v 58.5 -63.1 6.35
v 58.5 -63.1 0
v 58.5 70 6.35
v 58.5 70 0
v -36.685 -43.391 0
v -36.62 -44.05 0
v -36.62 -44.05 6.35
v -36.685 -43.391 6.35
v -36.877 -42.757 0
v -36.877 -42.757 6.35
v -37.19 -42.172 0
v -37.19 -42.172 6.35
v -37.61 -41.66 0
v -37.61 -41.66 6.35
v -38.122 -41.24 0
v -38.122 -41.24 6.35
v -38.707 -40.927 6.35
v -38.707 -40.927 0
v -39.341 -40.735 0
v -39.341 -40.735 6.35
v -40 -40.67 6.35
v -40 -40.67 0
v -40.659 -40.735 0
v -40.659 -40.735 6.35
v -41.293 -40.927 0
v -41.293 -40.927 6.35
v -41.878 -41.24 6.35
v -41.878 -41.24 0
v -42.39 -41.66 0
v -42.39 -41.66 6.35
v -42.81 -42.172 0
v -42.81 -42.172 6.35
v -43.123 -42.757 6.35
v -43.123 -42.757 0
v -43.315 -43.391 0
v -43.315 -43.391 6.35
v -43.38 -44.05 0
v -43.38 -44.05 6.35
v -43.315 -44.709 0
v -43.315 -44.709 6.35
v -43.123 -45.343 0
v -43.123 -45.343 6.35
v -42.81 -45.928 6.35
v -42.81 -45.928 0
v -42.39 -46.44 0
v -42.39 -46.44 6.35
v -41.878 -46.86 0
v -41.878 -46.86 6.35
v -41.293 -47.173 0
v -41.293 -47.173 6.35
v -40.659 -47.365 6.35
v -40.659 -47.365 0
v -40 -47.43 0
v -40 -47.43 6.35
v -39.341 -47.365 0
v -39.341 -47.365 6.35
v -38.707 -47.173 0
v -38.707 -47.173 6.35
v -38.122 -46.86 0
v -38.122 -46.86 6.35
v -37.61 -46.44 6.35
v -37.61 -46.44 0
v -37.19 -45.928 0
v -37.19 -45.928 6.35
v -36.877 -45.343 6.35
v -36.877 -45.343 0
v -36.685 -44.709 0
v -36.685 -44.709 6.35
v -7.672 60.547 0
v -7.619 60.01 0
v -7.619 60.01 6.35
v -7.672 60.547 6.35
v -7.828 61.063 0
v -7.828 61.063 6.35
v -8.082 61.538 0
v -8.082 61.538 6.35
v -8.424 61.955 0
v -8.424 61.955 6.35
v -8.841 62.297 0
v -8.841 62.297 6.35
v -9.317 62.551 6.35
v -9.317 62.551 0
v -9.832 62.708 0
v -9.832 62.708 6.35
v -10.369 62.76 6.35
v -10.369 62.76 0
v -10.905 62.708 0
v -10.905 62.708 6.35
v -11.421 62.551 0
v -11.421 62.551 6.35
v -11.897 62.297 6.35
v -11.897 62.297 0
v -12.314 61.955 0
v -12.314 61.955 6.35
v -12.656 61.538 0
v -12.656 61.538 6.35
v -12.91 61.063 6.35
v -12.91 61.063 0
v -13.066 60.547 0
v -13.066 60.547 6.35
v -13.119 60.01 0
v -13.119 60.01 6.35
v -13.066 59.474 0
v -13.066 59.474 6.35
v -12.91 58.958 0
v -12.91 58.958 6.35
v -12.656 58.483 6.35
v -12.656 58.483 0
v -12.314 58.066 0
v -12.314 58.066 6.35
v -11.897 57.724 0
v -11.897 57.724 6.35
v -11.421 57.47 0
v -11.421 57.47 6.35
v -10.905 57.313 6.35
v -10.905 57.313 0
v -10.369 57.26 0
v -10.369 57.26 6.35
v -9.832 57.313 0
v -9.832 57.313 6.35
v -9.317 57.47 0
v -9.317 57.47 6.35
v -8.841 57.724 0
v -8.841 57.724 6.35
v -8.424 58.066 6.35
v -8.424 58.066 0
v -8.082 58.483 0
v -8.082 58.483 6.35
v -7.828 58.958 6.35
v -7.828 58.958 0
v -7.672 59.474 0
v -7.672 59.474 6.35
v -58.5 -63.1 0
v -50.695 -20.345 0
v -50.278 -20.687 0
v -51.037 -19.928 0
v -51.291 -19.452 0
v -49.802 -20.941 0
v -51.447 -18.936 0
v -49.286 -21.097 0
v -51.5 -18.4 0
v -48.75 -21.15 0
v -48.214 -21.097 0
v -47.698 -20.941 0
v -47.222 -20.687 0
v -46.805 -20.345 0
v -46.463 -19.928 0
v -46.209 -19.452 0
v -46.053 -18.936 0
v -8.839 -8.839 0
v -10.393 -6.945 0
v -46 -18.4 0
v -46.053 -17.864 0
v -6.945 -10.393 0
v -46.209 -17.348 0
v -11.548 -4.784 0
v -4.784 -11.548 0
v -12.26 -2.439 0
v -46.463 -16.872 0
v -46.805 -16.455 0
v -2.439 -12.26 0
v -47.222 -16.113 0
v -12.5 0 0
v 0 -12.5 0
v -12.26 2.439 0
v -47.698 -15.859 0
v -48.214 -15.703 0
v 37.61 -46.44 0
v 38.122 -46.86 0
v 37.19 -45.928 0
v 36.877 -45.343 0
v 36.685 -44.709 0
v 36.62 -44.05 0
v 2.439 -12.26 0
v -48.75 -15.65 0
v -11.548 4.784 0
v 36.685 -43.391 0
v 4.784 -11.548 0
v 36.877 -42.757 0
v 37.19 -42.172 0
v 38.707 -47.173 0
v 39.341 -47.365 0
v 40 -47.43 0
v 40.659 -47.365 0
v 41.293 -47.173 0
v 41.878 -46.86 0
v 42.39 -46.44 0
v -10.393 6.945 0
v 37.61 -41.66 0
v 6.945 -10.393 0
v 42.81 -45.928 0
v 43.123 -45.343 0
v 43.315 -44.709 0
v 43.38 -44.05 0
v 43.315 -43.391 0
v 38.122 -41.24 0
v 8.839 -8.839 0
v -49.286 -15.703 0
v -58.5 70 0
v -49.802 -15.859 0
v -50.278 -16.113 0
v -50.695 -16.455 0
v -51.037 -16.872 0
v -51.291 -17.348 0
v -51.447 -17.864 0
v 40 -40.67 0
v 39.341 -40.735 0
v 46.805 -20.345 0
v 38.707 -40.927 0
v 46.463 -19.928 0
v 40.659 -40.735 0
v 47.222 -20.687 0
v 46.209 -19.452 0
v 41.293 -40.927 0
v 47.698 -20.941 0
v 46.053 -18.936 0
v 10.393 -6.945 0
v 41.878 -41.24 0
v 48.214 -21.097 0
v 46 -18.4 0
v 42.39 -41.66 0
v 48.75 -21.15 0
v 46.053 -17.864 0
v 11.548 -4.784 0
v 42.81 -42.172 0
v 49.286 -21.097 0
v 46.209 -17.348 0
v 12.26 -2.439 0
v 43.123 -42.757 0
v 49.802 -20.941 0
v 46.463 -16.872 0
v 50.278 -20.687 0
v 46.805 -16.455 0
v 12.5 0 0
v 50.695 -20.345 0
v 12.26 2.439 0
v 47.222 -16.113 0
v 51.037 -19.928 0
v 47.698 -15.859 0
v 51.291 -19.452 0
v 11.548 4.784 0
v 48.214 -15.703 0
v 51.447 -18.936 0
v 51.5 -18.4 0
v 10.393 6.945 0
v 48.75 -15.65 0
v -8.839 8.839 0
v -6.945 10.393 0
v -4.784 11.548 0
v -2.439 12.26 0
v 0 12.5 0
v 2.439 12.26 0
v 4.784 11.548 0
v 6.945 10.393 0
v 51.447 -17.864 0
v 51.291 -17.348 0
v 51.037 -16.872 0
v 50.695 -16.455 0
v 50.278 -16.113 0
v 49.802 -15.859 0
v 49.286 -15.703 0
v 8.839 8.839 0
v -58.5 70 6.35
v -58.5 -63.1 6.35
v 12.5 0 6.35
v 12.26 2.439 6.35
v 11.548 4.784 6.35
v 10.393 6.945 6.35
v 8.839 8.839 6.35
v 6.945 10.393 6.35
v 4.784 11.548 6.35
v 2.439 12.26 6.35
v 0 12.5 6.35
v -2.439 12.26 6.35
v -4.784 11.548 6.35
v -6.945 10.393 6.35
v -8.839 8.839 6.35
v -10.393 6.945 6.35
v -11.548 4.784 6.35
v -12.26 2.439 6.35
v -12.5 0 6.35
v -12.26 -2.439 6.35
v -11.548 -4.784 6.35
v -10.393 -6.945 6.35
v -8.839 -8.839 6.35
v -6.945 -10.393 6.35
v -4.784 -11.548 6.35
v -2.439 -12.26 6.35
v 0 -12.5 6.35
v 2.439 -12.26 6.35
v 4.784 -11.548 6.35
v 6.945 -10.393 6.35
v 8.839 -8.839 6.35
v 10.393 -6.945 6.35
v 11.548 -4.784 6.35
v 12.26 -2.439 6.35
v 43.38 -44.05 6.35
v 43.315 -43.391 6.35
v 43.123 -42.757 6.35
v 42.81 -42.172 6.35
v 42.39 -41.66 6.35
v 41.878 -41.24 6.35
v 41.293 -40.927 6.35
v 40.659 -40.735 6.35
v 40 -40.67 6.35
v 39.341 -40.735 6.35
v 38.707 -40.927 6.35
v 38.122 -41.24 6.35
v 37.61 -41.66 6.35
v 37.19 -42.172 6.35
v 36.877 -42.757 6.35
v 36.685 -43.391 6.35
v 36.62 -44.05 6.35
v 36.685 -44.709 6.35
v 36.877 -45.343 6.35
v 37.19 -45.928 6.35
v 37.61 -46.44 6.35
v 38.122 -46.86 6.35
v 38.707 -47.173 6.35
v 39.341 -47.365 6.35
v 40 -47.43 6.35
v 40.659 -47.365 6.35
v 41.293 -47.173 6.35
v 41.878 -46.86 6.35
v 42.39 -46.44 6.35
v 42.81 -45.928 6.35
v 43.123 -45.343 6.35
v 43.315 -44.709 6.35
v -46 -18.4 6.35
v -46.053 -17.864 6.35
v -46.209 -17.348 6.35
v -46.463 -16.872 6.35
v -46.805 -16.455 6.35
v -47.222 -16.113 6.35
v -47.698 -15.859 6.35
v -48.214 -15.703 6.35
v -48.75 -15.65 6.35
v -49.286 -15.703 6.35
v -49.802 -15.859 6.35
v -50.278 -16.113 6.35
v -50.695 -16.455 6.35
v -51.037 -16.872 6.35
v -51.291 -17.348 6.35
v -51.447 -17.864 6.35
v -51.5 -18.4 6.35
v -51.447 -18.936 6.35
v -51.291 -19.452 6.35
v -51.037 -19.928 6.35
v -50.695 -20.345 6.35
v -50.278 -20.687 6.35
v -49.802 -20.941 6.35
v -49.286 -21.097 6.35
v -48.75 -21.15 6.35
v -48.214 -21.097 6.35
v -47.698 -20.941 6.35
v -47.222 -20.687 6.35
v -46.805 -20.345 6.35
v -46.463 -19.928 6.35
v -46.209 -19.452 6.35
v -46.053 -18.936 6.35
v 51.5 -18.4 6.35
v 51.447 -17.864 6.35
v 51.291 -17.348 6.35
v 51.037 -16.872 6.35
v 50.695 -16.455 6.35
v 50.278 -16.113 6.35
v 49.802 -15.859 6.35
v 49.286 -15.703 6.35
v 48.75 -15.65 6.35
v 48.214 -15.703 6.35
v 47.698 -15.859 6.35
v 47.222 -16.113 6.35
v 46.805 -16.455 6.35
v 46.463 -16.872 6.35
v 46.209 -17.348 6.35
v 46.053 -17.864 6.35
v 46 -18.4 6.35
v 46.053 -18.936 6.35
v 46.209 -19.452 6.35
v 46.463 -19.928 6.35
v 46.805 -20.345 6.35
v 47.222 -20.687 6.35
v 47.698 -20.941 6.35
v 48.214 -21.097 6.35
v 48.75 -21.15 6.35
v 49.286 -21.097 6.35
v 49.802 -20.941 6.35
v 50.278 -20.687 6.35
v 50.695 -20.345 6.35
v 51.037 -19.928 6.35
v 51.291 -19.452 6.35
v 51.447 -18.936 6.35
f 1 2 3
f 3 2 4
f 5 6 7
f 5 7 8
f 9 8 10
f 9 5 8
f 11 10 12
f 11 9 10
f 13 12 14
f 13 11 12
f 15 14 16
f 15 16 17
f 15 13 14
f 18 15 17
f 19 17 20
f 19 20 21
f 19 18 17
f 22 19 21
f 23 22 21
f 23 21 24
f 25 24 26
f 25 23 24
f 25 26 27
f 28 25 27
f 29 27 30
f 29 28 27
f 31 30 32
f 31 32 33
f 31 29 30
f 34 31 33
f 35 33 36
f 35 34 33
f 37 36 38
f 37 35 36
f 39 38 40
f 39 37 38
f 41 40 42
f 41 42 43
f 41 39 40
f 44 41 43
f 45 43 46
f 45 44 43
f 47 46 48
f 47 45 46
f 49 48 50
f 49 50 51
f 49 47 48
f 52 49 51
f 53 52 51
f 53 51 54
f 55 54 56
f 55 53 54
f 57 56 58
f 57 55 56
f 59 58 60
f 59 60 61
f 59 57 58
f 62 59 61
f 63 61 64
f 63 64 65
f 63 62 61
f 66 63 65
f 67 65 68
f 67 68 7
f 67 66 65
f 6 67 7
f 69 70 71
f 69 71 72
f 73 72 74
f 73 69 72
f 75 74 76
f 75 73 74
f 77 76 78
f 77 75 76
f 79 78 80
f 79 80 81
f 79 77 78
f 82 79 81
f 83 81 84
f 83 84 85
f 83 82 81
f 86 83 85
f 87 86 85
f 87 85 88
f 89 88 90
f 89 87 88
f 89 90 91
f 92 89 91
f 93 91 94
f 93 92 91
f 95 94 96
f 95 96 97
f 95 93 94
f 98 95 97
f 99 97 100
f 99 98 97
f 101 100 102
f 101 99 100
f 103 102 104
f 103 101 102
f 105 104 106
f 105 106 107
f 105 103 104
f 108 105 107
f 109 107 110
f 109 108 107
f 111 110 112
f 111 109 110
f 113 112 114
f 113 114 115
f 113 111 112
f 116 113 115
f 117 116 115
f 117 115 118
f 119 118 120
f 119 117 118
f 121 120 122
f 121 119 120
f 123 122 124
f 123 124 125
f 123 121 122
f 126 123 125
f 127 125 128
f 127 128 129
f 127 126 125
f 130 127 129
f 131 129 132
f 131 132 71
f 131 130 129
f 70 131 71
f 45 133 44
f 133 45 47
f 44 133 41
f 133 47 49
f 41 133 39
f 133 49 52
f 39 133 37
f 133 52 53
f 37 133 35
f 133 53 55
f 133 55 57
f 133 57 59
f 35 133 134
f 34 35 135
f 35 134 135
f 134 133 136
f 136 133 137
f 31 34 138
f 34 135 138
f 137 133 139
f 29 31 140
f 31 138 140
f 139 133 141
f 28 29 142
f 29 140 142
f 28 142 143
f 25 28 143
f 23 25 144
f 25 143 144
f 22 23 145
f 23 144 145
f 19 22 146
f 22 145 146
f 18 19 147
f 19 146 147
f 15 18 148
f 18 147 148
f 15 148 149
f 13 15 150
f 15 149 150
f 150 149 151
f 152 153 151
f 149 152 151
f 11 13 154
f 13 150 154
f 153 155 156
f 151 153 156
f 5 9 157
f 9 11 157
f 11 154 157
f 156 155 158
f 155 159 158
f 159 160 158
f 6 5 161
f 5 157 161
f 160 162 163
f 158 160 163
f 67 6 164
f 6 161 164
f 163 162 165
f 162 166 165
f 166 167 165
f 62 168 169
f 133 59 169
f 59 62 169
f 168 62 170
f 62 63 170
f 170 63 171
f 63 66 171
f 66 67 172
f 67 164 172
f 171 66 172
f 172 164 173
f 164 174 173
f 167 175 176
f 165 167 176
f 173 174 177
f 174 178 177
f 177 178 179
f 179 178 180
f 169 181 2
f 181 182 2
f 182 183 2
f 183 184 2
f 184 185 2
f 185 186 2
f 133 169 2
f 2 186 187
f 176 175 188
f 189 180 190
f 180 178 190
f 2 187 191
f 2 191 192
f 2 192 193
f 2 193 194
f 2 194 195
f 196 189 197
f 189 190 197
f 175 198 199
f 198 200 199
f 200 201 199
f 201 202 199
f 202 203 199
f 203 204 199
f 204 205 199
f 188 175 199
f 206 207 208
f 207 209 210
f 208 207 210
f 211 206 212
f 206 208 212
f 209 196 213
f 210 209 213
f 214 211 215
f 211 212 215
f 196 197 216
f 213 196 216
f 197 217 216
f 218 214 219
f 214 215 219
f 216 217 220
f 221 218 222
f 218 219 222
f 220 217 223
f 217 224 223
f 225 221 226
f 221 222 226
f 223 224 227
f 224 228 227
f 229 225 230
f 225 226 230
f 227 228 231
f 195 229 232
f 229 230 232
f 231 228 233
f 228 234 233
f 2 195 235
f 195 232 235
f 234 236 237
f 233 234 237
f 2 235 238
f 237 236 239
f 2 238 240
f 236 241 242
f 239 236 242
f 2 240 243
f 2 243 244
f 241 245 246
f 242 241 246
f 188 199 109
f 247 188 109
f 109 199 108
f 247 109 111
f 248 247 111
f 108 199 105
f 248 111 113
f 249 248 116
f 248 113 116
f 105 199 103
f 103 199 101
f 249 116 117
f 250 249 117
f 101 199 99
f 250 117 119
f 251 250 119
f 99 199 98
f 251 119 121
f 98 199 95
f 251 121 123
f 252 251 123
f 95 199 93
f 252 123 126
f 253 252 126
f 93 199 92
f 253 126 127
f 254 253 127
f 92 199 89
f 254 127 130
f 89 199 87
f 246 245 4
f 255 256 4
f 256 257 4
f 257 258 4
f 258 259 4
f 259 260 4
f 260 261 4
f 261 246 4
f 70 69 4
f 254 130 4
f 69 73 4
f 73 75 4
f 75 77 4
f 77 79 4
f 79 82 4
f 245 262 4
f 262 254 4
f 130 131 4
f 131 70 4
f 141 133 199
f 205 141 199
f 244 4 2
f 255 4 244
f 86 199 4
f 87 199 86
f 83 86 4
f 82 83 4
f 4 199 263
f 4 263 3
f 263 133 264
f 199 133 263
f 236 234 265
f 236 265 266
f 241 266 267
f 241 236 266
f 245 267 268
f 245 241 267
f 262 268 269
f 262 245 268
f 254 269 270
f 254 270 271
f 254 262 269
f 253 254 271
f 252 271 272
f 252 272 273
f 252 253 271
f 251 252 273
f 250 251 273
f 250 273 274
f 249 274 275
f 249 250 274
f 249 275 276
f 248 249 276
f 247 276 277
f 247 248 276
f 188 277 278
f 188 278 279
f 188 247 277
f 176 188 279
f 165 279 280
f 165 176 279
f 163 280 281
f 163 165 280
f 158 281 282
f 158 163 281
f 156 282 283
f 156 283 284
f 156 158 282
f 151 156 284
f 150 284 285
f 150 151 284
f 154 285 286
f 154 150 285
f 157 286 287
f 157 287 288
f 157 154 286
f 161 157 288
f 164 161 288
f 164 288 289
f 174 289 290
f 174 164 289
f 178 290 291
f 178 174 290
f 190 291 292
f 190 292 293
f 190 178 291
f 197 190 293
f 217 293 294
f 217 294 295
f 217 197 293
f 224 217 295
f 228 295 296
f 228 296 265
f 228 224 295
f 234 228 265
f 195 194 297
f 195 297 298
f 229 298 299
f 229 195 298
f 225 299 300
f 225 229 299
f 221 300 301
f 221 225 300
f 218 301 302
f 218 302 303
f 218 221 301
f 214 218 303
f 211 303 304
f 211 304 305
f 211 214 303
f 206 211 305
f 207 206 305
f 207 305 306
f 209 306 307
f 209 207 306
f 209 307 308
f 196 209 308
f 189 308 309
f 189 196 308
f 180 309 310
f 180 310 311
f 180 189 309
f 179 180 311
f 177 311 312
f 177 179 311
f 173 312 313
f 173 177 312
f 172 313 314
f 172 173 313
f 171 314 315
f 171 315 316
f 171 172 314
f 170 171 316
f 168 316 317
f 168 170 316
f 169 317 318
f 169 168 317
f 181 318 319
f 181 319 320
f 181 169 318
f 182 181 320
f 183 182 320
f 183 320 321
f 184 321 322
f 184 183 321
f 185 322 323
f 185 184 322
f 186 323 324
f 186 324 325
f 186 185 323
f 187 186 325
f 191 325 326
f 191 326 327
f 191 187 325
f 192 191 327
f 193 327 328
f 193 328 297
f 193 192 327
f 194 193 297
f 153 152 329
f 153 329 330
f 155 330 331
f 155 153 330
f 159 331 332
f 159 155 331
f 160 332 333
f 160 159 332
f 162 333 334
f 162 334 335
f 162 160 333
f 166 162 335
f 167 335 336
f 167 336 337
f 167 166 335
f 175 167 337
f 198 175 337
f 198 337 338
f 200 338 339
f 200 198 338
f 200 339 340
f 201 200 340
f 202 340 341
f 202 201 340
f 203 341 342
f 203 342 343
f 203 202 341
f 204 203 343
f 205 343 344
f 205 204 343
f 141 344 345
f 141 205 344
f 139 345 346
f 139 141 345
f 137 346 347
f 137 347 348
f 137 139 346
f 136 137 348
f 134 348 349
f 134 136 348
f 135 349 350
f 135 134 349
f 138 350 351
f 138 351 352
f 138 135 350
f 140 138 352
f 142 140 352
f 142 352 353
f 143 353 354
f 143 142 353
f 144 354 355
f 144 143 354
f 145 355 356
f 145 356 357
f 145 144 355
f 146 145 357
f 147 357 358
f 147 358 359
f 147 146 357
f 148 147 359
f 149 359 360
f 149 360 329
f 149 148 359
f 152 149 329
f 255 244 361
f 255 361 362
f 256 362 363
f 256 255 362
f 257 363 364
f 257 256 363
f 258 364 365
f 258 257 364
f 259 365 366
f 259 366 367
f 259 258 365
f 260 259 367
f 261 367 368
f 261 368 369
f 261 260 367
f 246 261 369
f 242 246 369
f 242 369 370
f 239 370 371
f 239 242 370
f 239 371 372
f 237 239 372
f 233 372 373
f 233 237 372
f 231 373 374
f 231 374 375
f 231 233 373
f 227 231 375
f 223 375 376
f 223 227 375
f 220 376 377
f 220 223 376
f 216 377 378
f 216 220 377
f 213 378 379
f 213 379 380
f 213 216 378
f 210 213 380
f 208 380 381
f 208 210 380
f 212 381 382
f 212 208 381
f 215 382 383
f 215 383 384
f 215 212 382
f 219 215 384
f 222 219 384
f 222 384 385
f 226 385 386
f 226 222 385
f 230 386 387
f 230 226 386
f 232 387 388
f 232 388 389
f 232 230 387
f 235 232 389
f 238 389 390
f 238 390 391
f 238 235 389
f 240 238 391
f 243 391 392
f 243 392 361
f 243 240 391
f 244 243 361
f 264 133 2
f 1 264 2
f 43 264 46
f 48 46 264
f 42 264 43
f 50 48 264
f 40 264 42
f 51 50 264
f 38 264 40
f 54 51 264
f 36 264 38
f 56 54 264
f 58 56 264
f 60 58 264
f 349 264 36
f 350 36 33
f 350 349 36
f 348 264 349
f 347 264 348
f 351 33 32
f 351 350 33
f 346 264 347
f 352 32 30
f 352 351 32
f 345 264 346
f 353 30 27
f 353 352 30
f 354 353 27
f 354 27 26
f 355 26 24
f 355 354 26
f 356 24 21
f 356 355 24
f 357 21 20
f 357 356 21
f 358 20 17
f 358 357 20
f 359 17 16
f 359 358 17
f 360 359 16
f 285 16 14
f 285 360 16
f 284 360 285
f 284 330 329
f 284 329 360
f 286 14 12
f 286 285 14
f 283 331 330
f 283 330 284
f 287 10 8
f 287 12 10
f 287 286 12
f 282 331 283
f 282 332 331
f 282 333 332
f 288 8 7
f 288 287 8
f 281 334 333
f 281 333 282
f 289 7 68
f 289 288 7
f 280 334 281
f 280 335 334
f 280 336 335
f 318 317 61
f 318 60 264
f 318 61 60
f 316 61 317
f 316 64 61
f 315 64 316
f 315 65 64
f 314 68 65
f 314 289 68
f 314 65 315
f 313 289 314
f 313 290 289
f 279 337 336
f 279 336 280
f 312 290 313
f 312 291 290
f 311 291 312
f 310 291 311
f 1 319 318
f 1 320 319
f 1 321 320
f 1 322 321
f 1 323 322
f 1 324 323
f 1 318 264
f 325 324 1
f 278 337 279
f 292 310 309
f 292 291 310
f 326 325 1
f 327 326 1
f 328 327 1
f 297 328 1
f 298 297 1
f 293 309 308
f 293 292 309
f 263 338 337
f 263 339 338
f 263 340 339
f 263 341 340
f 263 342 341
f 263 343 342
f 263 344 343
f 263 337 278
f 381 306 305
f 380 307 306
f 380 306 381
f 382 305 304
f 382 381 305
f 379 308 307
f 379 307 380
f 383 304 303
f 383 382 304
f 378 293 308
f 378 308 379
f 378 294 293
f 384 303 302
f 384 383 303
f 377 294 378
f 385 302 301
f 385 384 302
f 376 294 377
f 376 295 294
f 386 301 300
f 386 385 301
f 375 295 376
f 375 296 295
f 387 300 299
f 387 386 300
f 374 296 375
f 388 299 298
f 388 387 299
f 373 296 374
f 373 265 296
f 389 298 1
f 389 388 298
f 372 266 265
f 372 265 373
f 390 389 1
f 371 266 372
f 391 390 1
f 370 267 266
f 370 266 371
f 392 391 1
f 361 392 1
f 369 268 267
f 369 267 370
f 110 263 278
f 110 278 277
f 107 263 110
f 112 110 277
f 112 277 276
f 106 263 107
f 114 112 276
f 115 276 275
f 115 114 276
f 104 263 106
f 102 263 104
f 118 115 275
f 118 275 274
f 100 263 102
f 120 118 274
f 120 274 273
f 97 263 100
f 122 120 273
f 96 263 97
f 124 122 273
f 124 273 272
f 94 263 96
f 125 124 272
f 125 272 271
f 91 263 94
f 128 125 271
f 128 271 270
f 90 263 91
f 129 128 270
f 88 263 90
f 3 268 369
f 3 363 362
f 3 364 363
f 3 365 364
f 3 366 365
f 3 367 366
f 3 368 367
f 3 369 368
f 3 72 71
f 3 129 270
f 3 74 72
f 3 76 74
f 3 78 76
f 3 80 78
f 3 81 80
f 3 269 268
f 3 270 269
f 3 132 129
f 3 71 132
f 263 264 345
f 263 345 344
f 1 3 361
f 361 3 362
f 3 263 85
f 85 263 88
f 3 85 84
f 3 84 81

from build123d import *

# Parameters (mm, degrees)
SKETCH1_W           = 117
SKETCH1_H           = 133.1
SKETCH1_R           = 2.75
SKETCH1_R_2         = 3.38
SKETCH1_R_3         = 12.5
BOSS_EXTRUDE1_DEPTH = 6.35


with BuildPart() as part:
    # Sketch1 → Boss-Extrude1 (new body)
    with BuildSketch(Plane.XY):
        with Locations((0, 3.45)):
            Rectangle(SKETCH1_W, SKETCH1_H)
        with Locations((-48.75, -18.4)):
            Circle(SKETCH1_R, mode=Mode.SUBTRACT)
        with Locations((48.75, -18.4)):
            Circle(SKETCH1_R, mode=Mode.SUBTRACT)
        with Locations((-10.368974359, 60.010374765)):
            Circle(SKETCH1_R, mode=Mode.SUBTRACT)
        with Locations((-40, -44.05)):
            Circle(SKETCH1_R_2, mode=Mode.SUBTRACT)
        with Locations((40, -44.05)):
            Circle(SKETCH1_R_2, mode=Mode.SUBTRACT)
        Circle(SKETCH1_R_3, mode=Mode.SUBTRACT)
    extrude(amount=BOSS_EXTRUDE1_DEPTH)


solid = part.part
